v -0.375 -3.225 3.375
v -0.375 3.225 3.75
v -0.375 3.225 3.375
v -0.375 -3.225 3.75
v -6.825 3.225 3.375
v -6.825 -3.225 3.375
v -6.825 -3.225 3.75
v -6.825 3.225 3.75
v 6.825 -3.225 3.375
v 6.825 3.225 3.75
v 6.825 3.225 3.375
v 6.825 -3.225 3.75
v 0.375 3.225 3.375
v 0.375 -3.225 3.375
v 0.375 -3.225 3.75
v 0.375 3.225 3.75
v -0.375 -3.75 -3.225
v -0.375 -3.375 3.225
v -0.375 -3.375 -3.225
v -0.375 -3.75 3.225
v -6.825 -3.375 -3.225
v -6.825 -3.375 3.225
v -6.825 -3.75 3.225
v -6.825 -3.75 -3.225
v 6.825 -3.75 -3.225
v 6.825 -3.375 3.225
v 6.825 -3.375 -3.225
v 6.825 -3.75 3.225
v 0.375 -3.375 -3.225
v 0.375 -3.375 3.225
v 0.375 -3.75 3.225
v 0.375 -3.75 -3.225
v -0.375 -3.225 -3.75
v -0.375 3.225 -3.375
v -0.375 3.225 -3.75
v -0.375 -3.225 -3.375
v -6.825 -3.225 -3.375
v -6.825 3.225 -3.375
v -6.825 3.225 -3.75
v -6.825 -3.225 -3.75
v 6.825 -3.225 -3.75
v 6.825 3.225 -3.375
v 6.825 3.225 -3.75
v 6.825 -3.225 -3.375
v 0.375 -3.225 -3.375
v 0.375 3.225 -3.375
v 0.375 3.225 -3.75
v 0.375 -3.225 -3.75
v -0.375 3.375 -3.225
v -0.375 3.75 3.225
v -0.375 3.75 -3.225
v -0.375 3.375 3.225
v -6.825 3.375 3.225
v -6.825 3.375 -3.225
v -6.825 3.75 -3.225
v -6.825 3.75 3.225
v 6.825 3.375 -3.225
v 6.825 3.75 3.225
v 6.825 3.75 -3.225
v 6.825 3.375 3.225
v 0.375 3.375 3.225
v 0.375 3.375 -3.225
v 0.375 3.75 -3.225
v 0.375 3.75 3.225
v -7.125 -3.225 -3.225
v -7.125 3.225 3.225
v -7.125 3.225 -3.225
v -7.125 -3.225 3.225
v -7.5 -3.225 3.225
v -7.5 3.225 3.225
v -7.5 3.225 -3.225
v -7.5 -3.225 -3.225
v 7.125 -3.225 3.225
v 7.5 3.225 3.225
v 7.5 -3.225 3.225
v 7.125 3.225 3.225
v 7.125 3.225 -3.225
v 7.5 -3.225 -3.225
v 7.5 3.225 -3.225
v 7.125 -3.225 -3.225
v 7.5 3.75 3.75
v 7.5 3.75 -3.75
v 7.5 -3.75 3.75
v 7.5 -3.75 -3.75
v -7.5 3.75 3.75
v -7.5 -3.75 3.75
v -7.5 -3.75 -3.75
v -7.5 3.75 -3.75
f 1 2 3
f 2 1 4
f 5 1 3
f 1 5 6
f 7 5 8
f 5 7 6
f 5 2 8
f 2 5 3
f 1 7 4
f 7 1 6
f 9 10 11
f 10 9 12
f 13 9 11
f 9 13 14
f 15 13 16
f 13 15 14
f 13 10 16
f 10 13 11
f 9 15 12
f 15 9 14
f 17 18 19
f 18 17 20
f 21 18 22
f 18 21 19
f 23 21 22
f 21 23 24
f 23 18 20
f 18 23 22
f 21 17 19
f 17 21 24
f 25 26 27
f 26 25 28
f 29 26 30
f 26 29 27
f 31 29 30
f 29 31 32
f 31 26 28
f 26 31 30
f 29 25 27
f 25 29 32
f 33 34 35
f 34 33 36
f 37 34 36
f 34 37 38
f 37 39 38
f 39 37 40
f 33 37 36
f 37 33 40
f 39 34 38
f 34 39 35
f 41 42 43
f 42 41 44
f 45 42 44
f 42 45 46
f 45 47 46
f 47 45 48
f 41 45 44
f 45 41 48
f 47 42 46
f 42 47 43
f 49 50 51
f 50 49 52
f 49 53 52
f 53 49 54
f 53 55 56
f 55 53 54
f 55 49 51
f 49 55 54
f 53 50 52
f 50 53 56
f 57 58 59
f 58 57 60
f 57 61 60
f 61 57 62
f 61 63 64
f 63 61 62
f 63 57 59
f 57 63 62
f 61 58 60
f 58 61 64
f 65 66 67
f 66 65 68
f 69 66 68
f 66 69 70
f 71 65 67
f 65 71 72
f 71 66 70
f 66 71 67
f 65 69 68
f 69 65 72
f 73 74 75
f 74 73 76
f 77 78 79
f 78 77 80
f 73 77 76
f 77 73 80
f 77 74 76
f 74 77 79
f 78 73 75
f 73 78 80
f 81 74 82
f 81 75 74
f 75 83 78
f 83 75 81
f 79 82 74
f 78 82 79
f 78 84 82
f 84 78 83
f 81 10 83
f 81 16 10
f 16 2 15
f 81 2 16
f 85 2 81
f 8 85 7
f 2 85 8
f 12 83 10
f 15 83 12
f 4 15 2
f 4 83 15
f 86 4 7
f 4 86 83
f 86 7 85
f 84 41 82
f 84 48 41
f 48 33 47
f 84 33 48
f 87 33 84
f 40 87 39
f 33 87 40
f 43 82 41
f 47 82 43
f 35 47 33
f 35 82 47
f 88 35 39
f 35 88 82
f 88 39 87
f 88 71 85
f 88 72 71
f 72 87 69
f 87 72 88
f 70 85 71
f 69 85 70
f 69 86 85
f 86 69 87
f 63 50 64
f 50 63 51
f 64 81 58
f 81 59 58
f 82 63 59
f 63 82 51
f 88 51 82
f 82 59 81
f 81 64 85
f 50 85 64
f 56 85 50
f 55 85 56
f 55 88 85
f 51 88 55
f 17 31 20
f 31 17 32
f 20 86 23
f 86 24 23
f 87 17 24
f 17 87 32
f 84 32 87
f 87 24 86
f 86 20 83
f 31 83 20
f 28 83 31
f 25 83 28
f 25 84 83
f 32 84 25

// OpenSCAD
module cargo_box()
{
	cube(size = [10, 5, 5], center = true);
}

module indentation()
{
	cube(size = [4.3, 4.3, 4.3], center = true);
}

module indentation_pair(angle)
{
	rotate(a = angle, v = [1, 0, 0]) {
		translate(v = [-2.4, 0, 4.4])
				indentation();
		translate(v = [2.4, 0, 4.4])
				indentation();
	}
}

module end_indentations()
{
	translate(v = [-6.9, 0, 0])
		indentation();
	translate(v = [6.9, 0, 0])
		indentation();
}

module cargo_container()
{
	scale(v = [1.5, 1.5, 1.5])
	difference() {
		cargo_box();
		indentation_pair(0);
		indentation_pair(90);
		indentation_pair(180);
		indentation_pair(270);
		end_indentations();
	}
}

cargo_container();
